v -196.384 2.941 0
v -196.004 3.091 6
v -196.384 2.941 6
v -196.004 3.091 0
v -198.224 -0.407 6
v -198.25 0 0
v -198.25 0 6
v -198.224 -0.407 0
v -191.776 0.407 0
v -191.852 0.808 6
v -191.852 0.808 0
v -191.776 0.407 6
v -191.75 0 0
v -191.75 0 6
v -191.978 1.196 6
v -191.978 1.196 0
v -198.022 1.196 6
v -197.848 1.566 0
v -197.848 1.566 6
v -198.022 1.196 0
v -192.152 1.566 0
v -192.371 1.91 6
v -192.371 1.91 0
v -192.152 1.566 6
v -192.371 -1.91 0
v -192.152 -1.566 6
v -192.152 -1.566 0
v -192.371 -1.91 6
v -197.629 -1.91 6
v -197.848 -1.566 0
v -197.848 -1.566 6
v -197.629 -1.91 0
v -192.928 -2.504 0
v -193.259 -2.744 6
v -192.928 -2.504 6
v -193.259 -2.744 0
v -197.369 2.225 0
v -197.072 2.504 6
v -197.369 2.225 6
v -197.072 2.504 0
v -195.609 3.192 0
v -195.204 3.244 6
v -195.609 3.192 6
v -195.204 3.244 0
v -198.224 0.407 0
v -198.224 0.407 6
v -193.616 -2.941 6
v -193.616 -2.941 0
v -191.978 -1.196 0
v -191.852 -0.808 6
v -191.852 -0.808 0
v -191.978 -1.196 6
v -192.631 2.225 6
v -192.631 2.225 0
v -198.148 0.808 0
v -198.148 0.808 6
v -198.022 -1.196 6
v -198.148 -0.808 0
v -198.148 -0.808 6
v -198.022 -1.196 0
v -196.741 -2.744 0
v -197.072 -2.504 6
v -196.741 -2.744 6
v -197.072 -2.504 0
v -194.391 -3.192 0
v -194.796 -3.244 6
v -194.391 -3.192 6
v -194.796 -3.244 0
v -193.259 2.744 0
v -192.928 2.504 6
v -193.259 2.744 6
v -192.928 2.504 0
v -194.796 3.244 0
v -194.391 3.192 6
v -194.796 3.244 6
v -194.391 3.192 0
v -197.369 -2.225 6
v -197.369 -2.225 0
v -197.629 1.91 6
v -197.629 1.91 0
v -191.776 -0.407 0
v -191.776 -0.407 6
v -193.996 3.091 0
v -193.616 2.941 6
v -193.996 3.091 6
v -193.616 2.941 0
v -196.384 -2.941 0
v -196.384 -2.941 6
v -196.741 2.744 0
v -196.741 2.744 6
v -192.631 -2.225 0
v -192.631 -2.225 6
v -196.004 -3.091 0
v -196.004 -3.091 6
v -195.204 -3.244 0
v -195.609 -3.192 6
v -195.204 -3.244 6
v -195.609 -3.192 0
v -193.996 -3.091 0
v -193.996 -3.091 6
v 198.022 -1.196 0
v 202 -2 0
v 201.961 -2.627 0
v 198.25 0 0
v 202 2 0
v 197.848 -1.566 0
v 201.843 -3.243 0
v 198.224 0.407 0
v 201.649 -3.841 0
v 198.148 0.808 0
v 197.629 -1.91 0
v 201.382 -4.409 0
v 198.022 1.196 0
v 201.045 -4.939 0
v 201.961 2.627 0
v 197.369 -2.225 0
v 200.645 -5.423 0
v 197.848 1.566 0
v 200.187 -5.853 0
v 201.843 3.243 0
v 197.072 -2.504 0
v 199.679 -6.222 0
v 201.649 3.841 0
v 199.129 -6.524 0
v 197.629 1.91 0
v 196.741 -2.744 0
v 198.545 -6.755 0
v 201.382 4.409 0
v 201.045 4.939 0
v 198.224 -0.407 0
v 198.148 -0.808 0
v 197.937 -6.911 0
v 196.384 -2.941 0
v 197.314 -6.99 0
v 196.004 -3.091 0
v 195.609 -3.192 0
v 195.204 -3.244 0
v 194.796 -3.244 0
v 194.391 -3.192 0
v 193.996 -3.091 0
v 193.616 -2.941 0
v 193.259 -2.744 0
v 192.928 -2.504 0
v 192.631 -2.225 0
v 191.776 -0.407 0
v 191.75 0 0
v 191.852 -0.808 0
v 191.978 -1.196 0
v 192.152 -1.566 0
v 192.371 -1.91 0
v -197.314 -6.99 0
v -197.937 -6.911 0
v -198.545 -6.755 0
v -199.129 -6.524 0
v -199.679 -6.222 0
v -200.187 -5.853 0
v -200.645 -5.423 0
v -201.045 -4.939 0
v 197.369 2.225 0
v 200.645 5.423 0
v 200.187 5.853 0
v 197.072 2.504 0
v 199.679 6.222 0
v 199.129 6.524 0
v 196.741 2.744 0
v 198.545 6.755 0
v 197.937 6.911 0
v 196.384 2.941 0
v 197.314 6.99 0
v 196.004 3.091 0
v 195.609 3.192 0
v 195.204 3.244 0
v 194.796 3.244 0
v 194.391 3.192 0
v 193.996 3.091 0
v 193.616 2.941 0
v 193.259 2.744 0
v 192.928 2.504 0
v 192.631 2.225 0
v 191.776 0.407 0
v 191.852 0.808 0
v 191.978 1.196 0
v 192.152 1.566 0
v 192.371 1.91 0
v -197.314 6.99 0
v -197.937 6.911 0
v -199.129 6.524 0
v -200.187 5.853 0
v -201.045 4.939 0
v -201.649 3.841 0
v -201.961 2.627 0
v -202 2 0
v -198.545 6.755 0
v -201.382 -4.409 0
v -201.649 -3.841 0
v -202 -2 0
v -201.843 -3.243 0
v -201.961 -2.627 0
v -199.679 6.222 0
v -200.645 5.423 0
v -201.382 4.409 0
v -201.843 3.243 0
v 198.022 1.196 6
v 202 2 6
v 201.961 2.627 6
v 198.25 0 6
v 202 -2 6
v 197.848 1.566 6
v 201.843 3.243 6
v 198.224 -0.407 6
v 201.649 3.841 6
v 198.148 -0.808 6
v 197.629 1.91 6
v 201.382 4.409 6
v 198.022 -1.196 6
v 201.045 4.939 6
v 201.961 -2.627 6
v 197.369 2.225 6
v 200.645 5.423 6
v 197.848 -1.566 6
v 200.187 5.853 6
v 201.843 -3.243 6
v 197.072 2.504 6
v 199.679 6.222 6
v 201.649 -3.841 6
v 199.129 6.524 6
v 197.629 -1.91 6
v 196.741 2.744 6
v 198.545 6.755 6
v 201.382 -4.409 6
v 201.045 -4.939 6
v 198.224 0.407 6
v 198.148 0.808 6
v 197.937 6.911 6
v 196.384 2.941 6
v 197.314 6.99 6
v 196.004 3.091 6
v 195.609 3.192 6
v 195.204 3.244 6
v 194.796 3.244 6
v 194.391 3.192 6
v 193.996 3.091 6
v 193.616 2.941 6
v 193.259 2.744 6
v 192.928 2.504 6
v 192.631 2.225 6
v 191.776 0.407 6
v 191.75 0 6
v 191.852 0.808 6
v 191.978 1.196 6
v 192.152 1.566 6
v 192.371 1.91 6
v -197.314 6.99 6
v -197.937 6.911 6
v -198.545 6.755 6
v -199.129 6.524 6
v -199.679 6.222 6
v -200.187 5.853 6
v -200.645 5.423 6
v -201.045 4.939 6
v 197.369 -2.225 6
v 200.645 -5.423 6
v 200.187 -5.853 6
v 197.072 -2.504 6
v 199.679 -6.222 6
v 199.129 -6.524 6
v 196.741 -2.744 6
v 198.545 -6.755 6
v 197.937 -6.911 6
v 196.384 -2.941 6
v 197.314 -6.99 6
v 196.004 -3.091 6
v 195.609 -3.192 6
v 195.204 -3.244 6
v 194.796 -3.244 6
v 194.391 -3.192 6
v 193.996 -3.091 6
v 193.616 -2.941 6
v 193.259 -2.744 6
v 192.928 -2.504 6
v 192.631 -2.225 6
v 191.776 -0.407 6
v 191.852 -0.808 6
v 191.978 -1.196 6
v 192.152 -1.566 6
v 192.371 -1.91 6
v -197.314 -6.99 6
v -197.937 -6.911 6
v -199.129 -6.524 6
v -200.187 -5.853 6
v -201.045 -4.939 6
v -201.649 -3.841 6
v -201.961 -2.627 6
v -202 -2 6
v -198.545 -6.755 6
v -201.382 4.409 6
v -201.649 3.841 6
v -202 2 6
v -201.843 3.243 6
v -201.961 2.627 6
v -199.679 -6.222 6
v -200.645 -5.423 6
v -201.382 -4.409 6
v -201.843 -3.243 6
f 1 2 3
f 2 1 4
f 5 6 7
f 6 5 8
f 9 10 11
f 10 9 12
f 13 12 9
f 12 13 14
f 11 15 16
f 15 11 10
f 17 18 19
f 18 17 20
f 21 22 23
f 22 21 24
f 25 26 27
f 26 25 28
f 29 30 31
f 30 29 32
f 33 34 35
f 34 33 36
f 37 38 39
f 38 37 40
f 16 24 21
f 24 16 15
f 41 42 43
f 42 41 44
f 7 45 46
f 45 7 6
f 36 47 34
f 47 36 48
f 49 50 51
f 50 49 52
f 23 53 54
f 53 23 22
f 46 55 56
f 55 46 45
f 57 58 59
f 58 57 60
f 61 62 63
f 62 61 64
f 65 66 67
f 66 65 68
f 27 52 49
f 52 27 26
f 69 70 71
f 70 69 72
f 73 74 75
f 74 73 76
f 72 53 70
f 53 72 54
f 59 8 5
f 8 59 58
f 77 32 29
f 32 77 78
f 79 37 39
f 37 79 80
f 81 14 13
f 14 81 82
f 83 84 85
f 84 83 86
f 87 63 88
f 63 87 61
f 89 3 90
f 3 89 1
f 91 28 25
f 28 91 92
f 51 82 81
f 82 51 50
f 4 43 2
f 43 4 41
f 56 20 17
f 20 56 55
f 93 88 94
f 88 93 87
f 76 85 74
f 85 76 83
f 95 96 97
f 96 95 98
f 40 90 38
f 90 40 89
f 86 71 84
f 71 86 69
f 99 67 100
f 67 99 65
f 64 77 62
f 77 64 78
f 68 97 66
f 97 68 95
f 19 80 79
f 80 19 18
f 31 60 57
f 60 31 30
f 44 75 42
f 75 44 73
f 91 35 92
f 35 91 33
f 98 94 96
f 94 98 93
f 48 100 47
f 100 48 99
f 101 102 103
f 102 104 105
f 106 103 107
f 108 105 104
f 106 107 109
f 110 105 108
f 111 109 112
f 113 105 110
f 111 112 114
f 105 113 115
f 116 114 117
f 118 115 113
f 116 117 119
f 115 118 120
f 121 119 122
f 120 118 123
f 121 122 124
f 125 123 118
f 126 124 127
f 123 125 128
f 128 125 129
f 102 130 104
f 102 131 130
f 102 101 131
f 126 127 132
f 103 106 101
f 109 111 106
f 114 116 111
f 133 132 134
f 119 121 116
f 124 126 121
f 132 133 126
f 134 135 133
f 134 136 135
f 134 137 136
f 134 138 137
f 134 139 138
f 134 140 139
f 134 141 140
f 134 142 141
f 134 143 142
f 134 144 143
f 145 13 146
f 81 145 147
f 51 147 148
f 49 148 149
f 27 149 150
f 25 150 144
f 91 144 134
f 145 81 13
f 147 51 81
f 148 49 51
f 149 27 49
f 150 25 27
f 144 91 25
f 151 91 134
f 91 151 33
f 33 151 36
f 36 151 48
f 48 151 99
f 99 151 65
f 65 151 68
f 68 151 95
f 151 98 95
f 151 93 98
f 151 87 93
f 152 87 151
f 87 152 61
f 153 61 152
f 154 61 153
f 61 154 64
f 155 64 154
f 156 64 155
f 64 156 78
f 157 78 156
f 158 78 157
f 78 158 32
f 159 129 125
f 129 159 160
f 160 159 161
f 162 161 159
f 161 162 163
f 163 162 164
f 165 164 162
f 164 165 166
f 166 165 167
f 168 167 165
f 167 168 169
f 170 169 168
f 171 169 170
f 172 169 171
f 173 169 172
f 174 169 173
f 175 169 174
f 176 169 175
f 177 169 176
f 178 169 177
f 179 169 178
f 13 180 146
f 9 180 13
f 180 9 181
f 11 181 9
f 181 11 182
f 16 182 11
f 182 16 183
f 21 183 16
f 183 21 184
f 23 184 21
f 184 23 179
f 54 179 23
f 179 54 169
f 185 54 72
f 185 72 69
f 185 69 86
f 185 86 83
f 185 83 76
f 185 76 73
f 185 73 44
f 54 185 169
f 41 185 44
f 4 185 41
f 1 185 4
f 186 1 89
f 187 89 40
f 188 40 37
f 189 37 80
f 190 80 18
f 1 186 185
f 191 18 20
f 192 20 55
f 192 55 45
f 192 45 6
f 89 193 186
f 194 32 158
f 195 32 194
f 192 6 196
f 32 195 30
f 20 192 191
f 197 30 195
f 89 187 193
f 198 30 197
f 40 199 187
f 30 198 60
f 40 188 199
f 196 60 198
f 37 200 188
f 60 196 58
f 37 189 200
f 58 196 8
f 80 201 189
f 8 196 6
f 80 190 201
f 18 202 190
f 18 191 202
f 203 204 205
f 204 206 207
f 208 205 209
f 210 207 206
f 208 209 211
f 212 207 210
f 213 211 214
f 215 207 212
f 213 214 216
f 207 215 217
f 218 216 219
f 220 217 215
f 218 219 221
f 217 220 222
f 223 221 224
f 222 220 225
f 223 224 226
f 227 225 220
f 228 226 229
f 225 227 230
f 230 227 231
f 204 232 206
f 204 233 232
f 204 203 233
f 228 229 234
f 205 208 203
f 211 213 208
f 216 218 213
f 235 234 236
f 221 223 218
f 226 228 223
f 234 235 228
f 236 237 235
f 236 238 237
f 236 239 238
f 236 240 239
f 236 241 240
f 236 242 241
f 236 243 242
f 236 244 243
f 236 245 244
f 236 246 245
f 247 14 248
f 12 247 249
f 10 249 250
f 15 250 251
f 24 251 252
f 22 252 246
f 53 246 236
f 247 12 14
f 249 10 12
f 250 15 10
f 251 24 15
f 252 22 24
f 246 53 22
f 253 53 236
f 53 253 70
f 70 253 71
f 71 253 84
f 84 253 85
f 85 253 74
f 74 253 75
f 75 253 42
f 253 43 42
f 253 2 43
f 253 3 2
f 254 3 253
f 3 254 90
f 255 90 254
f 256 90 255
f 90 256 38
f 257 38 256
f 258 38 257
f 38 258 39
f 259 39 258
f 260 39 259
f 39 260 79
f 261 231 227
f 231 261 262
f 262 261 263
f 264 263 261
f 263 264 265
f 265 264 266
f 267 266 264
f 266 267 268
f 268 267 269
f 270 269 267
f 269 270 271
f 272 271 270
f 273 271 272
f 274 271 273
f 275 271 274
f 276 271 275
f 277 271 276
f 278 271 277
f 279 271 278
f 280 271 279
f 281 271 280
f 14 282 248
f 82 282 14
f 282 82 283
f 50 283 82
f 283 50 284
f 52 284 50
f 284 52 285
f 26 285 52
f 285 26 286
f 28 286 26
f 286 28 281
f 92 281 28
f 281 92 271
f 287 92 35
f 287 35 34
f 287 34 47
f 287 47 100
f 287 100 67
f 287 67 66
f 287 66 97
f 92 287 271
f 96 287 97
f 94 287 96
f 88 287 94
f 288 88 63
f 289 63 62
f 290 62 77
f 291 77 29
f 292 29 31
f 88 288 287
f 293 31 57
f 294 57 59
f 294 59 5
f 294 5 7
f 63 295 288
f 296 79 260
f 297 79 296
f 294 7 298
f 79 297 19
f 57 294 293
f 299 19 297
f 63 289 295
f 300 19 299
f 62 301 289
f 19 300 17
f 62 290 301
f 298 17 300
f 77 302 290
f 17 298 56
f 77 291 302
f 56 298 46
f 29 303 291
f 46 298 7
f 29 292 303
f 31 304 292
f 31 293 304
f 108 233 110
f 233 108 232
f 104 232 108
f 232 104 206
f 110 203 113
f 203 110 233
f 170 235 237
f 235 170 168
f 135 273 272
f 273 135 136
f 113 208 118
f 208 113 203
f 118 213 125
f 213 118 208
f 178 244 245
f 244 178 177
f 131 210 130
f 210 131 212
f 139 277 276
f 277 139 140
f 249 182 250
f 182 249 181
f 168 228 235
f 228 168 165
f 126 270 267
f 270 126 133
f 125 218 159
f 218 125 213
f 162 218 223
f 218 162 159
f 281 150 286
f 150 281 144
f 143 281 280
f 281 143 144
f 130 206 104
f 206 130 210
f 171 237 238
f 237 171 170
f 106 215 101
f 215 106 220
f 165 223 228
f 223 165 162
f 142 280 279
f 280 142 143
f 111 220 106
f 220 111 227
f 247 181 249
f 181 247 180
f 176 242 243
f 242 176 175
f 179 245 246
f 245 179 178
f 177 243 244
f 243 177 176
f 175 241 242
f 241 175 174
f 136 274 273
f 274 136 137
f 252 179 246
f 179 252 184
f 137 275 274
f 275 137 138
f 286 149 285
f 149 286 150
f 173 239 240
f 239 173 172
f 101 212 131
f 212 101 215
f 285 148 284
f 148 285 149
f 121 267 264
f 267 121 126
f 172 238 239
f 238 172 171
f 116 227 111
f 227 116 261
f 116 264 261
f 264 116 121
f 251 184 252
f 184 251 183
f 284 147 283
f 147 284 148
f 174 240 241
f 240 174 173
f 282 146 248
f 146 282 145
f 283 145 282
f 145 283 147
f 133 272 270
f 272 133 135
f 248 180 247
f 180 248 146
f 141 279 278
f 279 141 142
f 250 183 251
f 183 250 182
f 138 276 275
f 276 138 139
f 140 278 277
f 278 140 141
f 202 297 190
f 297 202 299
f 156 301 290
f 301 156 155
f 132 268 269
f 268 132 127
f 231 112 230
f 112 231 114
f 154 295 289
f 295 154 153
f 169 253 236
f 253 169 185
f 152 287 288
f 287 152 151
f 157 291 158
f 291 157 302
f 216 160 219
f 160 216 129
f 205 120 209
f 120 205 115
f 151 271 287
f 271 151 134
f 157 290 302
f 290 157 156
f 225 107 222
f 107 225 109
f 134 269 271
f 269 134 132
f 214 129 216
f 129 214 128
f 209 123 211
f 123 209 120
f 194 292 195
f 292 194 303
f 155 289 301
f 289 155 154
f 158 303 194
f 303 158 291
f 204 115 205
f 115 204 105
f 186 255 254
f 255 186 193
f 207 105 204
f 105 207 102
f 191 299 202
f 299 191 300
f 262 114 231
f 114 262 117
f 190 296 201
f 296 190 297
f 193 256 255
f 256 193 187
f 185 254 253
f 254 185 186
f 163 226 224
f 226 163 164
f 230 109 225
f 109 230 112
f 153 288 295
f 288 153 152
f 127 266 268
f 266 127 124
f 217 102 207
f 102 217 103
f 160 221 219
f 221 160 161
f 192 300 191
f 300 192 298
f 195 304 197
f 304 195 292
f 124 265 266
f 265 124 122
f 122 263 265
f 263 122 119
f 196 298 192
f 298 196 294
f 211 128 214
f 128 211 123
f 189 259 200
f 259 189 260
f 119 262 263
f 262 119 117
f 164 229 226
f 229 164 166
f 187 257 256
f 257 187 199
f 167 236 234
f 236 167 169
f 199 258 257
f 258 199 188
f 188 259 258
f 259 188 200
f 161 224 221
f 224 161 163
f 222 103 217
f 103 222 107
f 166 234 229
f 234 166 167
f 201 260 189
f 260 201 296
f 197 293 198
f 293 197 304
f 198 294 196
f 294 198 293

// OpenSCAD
$fn = 50;


difference() {
	union() {
		hull() {
			translate(v = [-197.0000000000, 2.0000000000, 0]) {
				cylinder(h = 6, r = 5);
			}
			translate(v = [197.0000000000, 2.0000000000, 0]) {
				cylinder(h = 6, r = 5);
			}
			translate(v = [-197.0000000000, -2.0000000000, 0]) {
				cylinder(h = 6, r = 5);
			}
			translate(v = [197.0000000000, -2.0000000000, 0]) {
				cylinder(h = 6, r = 5);
			}
		}
	}
	union() {
		translate(v = [-195.0000000000, 0.0000000000, 0]) {
			cylinder(h = 6, r = 3.2500000000);
		}
		translate(v = [195.0000000000, 0.0000000000, 0]) {
			cylinder(h = 6, r = 3.2500000000);
		}
		translate(v = [-195.0000000000, 0.0000000000, 0]) {
			cylinder(h = 6, r = 1.8000000000);
		}
		translate(v = [195.0000000000, 0.0000000000, 0]) {
			cylinder(h = 6, r = 1.8000000000);
		}
		translate(v = [-195.0000000000, 0.0000000000, 0]) {
			cylinder(h = 6, r = 1.8000000000);
		}
		translate(v = [195.0000000000, 0.0000000000, 0]) {
			cylinder(h = 6, r = 1.8000000000);
		}
		translate(v = [-195.0000000000, 0.0000000000, 0]) {
			cylinder(h = 6, r = 1.8000000000);
		}
		translate(v = [195.0000000000, 0.0000000000, 0]) {
			cylinder(h = 6, r = 1.8000000000);
		}
	}
}
